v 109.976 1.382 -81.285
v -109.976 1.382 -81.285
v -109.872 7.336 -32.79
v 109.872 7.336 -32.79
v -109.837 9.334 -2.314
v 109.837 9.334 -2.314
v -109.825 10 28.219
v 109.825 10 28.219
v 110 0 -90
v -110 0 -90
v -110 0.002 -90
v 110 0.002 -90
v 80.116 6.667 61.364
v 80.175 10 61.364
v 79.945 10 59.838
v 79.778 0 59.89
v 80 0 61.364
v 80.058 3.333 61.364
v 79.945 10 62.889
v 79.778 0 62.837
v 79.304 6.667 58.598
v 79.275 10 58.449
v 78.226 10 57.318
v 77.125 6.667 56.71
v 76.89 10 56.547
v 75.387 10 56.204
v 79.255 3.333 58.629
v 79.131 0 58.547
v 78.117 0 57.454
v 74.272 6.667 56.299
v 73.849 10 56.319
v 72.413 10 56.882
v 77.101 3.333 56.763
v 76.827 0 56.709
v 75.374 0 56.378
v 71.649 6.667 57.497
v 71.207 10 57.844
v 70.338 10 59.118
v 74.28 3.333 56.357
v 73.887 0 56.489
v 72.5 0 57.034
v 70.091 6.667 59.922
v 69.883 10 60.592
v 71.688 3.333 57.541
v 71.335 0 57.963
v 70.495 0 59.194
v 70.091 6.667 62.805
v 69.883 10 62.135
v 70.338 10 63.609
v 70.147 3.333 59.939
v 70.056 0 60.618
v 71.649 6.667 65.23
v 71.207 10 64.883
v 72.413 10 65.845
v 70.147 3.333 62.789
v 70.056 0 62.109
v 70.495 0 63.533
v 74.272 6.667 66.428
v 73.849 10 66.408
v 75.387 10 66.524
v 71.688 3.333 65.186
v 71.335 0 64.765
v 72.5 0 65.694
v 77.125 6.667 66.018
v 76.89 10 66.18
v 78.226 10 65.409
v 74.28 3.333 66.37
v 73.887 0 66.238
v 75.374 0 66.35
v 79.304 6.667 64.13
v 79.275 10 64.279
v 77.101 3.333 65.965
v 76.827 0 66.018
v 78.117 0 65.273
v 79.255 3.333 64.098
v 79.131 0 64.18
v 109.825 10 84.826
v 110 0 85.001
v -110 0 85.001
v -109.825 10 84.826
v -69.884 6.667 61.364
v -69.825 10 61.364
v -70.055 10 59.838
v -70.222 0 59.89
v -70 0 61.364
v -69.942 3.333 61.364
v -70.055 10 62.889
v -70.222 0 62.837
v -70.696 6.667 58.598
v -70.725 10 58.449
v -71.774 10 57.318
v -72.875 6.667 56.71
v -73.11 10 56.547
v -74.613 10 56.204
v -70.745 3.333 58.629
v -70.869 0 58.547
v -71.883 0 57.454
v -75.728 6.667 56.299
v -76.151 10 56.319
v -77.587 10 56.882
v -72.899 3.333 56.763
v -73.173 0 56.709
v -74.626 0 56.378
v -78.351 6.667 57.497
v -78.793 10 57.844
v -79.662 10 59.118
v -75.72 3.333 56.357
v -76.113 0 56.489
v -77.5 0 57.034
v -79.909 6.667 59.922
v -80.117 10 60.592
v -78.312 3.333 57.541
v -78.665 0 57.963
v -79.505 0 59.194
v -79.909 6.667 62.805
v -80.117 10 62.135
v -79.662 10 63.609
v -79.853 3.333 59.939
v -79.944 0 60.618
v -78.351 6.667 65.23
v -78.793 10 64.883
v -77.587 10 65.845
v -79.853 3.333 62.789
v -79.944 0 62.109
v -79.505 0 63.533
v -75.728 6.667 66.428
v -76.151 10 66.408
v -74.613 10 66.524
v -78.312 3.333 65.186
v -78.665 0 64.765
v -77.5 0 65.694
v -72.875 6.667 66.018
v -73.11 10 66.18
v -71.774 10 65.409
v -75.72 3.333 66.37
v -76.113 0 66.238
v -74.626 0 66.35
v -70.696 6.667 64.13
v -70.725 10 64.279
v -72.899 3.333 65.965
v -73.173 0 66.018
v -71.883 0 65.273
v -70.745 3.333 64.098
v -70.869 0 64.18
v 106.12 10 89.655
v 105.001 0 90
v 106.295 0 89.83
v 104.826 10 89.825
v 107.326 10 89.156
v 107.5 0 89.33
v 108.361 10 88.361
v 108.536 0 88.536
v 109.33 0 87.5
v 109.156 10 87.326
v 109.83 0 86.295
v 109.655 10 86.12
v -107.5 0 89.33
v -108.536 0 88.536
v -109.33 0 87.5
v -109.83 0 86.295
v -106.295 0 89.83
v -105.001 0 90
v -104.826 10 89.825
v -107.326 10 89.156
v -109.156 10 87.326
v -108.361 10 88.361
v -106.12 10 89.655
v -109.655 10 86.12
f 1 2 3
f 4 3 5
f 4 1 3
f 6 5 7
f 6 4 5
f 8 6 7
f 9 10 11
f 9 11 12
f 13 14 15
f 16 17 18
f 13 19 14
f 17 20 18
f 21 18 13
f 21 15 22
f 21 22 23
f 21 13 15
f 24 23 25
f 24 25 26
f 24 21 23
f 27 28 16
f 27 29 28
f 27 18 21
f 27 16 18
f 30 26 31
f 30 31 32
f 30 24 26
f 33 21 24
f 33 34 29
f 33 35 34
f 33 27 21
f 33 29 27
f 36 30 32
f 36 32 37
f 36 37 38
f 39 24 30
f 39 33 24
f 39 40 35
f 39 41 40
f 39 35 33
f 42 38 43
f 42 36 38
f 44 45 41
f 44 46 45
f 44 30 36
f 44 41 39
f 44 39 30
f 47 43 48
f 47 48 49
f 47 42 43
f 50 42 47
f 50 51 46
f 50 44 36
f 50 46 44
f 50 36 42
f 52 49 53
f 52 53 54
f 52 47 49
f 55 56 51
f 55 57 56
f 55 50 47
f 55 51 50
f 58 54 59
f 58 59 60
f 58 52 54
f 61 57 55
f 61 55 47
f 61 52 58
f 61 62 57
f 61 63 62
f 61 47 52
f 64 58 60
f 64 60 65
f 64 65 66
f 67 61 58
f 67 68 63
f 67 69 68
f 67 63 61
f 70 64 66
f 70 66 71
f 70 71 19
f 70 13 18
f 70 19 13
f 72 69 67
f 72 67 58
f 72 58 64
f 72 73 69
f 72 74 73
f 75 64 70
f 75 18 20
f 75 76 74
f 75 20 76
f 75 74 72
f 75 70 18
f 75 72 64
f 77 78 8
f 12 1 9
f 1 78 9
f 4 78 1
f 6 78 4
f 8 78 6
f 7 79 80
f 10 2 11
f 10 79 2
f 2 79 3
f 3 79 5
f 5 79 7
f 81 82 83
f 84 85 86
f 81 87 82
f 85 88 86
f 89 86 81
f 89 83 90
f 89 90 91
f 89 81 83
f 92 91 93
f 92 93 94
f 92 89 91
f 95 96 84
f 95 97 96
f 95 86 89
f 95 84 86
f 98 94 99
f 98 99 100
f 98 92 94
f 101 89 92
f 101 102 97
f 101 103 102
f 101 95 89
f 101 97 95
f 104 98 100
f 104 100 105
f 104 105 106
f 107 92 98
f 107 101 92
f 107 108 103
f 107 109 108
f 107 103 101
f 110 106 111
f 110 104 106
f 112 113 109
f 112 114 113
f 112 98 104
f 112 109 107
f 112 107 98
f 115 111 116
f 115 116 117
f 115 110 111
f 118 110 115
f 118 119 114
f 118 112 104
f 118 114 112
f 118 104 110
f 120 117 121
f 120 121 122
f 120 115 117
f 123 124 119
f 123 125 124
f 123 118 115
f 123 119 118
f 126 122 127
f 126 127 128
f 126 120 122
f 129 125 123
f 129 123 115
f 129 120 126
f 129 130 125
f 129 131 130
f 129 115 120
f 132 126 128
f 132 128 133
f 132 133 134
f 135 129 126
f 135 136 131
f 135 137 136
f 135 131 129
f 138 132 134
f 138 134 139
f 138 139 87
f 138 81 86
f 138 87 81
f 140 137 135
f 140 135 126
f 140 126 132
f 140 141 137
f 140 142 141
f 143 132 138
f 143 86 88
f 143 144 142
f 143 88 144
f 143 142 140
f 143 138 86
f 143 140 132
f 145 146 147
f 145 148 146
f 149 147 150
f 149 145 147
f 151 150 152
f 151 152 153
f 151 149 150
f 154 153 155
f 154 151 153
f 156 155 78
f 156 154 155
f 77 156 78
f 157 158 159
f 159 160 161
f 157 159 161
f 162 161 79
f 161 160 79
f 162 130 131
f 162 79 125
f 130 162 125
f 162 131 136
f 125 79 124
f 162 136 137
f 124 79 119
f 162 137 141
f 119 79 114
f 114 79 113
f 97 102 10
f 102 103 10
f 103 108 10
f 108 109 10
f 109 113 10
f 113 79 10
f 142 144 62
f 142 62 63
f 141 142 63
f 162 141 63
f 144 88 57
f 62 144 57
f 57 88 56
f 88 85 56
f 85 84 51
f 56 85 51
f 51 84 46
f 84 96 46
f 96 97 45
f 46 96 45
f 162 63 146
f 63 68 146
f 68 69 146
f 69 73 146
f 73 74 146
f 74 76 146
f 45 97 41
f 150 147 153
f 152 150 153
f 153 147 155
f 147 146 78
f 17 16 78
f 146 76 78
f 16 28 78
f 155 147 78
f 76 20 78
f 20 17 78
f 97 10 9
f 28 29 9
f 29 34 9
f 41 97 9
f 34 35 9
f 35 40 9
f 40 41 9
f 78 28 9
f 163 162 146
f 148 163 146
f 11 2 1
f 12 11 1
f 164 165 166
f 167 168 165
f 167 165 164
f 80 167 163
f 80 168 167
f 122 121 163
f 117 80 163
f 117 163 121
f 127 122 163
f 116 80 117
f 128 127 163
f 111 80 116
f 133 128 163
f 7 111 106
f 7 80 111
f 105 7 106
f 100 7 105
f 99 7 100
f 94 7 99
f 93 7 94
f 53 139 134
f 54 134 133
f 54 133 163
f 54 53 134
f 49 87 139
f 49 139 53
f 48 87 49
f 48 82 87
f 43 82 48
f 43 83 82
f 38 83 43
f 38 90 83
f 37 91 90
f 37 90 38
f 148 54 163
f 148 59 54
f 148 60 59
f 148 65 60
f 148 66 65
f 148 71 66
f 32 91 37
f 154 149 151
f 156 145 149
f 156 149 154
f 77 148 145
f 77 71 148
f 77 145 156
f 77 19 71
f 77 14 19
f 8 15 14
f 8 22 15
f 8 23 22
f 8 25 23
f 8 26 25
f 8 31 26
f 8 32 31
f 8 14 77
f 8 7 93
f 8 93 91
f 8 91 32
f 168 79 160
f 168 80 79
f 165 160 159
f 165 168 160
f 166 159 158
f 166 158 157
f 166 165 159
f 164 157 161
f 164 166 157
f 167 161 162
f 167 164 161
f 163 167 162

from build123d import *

# Parameters (mm, degrees)
SKETCH_1_W      = 220
SKETCH_1_H      = 180
SKETCH_1_R      = 5
EXTRUDE_1_DEPTH = 10
EXTRUDE_1_DRAFT = 1
FILLET_1_R      = 5
CHAMFER_1_SIZE  = 10
CHAMFER_1_SIZE2 = 62.953374933
FILLET_2_R      = 700


with BuildPart() as part:
    # 草图1 → 凸台-拉伸1 (with draft: the straight prism first)
    with BuildSketch(Plane(origin=(0, 0, 0), x_dir=(1, 0, 0), z_dir=(0, 1, 0))):
        Rectangle(SKETCH_1_W, SKETCH_1_H)
        with Locations((-75, -61.363636364)):
            Circle(SKETCH_1_R, mode=Mode.SUBTRACT)
        with Locations((75, -61.363636364)):
            Circle(SKETCH_1_R, mode=Mode.SUBTRACT)
    extrude(amount=EXTRUDE_1_DEPTH)
    # 凸台-拉伸1: the draft: its side faces are tilted about the plane it starts from
    extrude_1_sides = [part.faces().sort_by_distance(p)[0] for p in [
        (0, 5, 90),
        (110, 5, 0),
        (0, 5, -90),
        (-110, 5, 0),
        (-80, 5, 61.363636364),
        (70, 5, 61.363636364),
    ]]
    draft(extrude_1_sides, Plane(origin=(0, 0, 0), x_dir=(1, 0, 0), z_dir=(0, 1, 0)), EXTRUDE_1_DRAFT)

    # 圆角1
    fillet_1_edges = [part.edges().sort_by_distance(p)[0] for p in [
        (109.912724675, 5, 89.912724675),
        (-109.912724675, 5, 89.912724675),
    ]]
    fillet(fillet_1_edges, radius=FILLET_1_R)

    # 倒角1
    chamfer_1_edges = [part.edges().sort_by_distance(p)[0] for p in [
        (0, 10, -89.825449351),
    ]]
    chamfer_1_side = [part.faces().sort_by_distance(p)[0] for p in [
        (0, 4.998676597, -89.912747775),
    ]]
    chamfer(chamfer_1_edges, length=CHAMFER_1_SIZE, length2=CHAMFER_1_SIZE2, reference=chamfer_1_side[0])

    # 圆角2
    fillet_2_edges = [part.edges().sort_by_distance(p)[0] for p in [
        (0, 10, -26.872074418),
    ]]
    fillet(fillet_2_edges, radius=FILLET_2_R)


solid = part.part
